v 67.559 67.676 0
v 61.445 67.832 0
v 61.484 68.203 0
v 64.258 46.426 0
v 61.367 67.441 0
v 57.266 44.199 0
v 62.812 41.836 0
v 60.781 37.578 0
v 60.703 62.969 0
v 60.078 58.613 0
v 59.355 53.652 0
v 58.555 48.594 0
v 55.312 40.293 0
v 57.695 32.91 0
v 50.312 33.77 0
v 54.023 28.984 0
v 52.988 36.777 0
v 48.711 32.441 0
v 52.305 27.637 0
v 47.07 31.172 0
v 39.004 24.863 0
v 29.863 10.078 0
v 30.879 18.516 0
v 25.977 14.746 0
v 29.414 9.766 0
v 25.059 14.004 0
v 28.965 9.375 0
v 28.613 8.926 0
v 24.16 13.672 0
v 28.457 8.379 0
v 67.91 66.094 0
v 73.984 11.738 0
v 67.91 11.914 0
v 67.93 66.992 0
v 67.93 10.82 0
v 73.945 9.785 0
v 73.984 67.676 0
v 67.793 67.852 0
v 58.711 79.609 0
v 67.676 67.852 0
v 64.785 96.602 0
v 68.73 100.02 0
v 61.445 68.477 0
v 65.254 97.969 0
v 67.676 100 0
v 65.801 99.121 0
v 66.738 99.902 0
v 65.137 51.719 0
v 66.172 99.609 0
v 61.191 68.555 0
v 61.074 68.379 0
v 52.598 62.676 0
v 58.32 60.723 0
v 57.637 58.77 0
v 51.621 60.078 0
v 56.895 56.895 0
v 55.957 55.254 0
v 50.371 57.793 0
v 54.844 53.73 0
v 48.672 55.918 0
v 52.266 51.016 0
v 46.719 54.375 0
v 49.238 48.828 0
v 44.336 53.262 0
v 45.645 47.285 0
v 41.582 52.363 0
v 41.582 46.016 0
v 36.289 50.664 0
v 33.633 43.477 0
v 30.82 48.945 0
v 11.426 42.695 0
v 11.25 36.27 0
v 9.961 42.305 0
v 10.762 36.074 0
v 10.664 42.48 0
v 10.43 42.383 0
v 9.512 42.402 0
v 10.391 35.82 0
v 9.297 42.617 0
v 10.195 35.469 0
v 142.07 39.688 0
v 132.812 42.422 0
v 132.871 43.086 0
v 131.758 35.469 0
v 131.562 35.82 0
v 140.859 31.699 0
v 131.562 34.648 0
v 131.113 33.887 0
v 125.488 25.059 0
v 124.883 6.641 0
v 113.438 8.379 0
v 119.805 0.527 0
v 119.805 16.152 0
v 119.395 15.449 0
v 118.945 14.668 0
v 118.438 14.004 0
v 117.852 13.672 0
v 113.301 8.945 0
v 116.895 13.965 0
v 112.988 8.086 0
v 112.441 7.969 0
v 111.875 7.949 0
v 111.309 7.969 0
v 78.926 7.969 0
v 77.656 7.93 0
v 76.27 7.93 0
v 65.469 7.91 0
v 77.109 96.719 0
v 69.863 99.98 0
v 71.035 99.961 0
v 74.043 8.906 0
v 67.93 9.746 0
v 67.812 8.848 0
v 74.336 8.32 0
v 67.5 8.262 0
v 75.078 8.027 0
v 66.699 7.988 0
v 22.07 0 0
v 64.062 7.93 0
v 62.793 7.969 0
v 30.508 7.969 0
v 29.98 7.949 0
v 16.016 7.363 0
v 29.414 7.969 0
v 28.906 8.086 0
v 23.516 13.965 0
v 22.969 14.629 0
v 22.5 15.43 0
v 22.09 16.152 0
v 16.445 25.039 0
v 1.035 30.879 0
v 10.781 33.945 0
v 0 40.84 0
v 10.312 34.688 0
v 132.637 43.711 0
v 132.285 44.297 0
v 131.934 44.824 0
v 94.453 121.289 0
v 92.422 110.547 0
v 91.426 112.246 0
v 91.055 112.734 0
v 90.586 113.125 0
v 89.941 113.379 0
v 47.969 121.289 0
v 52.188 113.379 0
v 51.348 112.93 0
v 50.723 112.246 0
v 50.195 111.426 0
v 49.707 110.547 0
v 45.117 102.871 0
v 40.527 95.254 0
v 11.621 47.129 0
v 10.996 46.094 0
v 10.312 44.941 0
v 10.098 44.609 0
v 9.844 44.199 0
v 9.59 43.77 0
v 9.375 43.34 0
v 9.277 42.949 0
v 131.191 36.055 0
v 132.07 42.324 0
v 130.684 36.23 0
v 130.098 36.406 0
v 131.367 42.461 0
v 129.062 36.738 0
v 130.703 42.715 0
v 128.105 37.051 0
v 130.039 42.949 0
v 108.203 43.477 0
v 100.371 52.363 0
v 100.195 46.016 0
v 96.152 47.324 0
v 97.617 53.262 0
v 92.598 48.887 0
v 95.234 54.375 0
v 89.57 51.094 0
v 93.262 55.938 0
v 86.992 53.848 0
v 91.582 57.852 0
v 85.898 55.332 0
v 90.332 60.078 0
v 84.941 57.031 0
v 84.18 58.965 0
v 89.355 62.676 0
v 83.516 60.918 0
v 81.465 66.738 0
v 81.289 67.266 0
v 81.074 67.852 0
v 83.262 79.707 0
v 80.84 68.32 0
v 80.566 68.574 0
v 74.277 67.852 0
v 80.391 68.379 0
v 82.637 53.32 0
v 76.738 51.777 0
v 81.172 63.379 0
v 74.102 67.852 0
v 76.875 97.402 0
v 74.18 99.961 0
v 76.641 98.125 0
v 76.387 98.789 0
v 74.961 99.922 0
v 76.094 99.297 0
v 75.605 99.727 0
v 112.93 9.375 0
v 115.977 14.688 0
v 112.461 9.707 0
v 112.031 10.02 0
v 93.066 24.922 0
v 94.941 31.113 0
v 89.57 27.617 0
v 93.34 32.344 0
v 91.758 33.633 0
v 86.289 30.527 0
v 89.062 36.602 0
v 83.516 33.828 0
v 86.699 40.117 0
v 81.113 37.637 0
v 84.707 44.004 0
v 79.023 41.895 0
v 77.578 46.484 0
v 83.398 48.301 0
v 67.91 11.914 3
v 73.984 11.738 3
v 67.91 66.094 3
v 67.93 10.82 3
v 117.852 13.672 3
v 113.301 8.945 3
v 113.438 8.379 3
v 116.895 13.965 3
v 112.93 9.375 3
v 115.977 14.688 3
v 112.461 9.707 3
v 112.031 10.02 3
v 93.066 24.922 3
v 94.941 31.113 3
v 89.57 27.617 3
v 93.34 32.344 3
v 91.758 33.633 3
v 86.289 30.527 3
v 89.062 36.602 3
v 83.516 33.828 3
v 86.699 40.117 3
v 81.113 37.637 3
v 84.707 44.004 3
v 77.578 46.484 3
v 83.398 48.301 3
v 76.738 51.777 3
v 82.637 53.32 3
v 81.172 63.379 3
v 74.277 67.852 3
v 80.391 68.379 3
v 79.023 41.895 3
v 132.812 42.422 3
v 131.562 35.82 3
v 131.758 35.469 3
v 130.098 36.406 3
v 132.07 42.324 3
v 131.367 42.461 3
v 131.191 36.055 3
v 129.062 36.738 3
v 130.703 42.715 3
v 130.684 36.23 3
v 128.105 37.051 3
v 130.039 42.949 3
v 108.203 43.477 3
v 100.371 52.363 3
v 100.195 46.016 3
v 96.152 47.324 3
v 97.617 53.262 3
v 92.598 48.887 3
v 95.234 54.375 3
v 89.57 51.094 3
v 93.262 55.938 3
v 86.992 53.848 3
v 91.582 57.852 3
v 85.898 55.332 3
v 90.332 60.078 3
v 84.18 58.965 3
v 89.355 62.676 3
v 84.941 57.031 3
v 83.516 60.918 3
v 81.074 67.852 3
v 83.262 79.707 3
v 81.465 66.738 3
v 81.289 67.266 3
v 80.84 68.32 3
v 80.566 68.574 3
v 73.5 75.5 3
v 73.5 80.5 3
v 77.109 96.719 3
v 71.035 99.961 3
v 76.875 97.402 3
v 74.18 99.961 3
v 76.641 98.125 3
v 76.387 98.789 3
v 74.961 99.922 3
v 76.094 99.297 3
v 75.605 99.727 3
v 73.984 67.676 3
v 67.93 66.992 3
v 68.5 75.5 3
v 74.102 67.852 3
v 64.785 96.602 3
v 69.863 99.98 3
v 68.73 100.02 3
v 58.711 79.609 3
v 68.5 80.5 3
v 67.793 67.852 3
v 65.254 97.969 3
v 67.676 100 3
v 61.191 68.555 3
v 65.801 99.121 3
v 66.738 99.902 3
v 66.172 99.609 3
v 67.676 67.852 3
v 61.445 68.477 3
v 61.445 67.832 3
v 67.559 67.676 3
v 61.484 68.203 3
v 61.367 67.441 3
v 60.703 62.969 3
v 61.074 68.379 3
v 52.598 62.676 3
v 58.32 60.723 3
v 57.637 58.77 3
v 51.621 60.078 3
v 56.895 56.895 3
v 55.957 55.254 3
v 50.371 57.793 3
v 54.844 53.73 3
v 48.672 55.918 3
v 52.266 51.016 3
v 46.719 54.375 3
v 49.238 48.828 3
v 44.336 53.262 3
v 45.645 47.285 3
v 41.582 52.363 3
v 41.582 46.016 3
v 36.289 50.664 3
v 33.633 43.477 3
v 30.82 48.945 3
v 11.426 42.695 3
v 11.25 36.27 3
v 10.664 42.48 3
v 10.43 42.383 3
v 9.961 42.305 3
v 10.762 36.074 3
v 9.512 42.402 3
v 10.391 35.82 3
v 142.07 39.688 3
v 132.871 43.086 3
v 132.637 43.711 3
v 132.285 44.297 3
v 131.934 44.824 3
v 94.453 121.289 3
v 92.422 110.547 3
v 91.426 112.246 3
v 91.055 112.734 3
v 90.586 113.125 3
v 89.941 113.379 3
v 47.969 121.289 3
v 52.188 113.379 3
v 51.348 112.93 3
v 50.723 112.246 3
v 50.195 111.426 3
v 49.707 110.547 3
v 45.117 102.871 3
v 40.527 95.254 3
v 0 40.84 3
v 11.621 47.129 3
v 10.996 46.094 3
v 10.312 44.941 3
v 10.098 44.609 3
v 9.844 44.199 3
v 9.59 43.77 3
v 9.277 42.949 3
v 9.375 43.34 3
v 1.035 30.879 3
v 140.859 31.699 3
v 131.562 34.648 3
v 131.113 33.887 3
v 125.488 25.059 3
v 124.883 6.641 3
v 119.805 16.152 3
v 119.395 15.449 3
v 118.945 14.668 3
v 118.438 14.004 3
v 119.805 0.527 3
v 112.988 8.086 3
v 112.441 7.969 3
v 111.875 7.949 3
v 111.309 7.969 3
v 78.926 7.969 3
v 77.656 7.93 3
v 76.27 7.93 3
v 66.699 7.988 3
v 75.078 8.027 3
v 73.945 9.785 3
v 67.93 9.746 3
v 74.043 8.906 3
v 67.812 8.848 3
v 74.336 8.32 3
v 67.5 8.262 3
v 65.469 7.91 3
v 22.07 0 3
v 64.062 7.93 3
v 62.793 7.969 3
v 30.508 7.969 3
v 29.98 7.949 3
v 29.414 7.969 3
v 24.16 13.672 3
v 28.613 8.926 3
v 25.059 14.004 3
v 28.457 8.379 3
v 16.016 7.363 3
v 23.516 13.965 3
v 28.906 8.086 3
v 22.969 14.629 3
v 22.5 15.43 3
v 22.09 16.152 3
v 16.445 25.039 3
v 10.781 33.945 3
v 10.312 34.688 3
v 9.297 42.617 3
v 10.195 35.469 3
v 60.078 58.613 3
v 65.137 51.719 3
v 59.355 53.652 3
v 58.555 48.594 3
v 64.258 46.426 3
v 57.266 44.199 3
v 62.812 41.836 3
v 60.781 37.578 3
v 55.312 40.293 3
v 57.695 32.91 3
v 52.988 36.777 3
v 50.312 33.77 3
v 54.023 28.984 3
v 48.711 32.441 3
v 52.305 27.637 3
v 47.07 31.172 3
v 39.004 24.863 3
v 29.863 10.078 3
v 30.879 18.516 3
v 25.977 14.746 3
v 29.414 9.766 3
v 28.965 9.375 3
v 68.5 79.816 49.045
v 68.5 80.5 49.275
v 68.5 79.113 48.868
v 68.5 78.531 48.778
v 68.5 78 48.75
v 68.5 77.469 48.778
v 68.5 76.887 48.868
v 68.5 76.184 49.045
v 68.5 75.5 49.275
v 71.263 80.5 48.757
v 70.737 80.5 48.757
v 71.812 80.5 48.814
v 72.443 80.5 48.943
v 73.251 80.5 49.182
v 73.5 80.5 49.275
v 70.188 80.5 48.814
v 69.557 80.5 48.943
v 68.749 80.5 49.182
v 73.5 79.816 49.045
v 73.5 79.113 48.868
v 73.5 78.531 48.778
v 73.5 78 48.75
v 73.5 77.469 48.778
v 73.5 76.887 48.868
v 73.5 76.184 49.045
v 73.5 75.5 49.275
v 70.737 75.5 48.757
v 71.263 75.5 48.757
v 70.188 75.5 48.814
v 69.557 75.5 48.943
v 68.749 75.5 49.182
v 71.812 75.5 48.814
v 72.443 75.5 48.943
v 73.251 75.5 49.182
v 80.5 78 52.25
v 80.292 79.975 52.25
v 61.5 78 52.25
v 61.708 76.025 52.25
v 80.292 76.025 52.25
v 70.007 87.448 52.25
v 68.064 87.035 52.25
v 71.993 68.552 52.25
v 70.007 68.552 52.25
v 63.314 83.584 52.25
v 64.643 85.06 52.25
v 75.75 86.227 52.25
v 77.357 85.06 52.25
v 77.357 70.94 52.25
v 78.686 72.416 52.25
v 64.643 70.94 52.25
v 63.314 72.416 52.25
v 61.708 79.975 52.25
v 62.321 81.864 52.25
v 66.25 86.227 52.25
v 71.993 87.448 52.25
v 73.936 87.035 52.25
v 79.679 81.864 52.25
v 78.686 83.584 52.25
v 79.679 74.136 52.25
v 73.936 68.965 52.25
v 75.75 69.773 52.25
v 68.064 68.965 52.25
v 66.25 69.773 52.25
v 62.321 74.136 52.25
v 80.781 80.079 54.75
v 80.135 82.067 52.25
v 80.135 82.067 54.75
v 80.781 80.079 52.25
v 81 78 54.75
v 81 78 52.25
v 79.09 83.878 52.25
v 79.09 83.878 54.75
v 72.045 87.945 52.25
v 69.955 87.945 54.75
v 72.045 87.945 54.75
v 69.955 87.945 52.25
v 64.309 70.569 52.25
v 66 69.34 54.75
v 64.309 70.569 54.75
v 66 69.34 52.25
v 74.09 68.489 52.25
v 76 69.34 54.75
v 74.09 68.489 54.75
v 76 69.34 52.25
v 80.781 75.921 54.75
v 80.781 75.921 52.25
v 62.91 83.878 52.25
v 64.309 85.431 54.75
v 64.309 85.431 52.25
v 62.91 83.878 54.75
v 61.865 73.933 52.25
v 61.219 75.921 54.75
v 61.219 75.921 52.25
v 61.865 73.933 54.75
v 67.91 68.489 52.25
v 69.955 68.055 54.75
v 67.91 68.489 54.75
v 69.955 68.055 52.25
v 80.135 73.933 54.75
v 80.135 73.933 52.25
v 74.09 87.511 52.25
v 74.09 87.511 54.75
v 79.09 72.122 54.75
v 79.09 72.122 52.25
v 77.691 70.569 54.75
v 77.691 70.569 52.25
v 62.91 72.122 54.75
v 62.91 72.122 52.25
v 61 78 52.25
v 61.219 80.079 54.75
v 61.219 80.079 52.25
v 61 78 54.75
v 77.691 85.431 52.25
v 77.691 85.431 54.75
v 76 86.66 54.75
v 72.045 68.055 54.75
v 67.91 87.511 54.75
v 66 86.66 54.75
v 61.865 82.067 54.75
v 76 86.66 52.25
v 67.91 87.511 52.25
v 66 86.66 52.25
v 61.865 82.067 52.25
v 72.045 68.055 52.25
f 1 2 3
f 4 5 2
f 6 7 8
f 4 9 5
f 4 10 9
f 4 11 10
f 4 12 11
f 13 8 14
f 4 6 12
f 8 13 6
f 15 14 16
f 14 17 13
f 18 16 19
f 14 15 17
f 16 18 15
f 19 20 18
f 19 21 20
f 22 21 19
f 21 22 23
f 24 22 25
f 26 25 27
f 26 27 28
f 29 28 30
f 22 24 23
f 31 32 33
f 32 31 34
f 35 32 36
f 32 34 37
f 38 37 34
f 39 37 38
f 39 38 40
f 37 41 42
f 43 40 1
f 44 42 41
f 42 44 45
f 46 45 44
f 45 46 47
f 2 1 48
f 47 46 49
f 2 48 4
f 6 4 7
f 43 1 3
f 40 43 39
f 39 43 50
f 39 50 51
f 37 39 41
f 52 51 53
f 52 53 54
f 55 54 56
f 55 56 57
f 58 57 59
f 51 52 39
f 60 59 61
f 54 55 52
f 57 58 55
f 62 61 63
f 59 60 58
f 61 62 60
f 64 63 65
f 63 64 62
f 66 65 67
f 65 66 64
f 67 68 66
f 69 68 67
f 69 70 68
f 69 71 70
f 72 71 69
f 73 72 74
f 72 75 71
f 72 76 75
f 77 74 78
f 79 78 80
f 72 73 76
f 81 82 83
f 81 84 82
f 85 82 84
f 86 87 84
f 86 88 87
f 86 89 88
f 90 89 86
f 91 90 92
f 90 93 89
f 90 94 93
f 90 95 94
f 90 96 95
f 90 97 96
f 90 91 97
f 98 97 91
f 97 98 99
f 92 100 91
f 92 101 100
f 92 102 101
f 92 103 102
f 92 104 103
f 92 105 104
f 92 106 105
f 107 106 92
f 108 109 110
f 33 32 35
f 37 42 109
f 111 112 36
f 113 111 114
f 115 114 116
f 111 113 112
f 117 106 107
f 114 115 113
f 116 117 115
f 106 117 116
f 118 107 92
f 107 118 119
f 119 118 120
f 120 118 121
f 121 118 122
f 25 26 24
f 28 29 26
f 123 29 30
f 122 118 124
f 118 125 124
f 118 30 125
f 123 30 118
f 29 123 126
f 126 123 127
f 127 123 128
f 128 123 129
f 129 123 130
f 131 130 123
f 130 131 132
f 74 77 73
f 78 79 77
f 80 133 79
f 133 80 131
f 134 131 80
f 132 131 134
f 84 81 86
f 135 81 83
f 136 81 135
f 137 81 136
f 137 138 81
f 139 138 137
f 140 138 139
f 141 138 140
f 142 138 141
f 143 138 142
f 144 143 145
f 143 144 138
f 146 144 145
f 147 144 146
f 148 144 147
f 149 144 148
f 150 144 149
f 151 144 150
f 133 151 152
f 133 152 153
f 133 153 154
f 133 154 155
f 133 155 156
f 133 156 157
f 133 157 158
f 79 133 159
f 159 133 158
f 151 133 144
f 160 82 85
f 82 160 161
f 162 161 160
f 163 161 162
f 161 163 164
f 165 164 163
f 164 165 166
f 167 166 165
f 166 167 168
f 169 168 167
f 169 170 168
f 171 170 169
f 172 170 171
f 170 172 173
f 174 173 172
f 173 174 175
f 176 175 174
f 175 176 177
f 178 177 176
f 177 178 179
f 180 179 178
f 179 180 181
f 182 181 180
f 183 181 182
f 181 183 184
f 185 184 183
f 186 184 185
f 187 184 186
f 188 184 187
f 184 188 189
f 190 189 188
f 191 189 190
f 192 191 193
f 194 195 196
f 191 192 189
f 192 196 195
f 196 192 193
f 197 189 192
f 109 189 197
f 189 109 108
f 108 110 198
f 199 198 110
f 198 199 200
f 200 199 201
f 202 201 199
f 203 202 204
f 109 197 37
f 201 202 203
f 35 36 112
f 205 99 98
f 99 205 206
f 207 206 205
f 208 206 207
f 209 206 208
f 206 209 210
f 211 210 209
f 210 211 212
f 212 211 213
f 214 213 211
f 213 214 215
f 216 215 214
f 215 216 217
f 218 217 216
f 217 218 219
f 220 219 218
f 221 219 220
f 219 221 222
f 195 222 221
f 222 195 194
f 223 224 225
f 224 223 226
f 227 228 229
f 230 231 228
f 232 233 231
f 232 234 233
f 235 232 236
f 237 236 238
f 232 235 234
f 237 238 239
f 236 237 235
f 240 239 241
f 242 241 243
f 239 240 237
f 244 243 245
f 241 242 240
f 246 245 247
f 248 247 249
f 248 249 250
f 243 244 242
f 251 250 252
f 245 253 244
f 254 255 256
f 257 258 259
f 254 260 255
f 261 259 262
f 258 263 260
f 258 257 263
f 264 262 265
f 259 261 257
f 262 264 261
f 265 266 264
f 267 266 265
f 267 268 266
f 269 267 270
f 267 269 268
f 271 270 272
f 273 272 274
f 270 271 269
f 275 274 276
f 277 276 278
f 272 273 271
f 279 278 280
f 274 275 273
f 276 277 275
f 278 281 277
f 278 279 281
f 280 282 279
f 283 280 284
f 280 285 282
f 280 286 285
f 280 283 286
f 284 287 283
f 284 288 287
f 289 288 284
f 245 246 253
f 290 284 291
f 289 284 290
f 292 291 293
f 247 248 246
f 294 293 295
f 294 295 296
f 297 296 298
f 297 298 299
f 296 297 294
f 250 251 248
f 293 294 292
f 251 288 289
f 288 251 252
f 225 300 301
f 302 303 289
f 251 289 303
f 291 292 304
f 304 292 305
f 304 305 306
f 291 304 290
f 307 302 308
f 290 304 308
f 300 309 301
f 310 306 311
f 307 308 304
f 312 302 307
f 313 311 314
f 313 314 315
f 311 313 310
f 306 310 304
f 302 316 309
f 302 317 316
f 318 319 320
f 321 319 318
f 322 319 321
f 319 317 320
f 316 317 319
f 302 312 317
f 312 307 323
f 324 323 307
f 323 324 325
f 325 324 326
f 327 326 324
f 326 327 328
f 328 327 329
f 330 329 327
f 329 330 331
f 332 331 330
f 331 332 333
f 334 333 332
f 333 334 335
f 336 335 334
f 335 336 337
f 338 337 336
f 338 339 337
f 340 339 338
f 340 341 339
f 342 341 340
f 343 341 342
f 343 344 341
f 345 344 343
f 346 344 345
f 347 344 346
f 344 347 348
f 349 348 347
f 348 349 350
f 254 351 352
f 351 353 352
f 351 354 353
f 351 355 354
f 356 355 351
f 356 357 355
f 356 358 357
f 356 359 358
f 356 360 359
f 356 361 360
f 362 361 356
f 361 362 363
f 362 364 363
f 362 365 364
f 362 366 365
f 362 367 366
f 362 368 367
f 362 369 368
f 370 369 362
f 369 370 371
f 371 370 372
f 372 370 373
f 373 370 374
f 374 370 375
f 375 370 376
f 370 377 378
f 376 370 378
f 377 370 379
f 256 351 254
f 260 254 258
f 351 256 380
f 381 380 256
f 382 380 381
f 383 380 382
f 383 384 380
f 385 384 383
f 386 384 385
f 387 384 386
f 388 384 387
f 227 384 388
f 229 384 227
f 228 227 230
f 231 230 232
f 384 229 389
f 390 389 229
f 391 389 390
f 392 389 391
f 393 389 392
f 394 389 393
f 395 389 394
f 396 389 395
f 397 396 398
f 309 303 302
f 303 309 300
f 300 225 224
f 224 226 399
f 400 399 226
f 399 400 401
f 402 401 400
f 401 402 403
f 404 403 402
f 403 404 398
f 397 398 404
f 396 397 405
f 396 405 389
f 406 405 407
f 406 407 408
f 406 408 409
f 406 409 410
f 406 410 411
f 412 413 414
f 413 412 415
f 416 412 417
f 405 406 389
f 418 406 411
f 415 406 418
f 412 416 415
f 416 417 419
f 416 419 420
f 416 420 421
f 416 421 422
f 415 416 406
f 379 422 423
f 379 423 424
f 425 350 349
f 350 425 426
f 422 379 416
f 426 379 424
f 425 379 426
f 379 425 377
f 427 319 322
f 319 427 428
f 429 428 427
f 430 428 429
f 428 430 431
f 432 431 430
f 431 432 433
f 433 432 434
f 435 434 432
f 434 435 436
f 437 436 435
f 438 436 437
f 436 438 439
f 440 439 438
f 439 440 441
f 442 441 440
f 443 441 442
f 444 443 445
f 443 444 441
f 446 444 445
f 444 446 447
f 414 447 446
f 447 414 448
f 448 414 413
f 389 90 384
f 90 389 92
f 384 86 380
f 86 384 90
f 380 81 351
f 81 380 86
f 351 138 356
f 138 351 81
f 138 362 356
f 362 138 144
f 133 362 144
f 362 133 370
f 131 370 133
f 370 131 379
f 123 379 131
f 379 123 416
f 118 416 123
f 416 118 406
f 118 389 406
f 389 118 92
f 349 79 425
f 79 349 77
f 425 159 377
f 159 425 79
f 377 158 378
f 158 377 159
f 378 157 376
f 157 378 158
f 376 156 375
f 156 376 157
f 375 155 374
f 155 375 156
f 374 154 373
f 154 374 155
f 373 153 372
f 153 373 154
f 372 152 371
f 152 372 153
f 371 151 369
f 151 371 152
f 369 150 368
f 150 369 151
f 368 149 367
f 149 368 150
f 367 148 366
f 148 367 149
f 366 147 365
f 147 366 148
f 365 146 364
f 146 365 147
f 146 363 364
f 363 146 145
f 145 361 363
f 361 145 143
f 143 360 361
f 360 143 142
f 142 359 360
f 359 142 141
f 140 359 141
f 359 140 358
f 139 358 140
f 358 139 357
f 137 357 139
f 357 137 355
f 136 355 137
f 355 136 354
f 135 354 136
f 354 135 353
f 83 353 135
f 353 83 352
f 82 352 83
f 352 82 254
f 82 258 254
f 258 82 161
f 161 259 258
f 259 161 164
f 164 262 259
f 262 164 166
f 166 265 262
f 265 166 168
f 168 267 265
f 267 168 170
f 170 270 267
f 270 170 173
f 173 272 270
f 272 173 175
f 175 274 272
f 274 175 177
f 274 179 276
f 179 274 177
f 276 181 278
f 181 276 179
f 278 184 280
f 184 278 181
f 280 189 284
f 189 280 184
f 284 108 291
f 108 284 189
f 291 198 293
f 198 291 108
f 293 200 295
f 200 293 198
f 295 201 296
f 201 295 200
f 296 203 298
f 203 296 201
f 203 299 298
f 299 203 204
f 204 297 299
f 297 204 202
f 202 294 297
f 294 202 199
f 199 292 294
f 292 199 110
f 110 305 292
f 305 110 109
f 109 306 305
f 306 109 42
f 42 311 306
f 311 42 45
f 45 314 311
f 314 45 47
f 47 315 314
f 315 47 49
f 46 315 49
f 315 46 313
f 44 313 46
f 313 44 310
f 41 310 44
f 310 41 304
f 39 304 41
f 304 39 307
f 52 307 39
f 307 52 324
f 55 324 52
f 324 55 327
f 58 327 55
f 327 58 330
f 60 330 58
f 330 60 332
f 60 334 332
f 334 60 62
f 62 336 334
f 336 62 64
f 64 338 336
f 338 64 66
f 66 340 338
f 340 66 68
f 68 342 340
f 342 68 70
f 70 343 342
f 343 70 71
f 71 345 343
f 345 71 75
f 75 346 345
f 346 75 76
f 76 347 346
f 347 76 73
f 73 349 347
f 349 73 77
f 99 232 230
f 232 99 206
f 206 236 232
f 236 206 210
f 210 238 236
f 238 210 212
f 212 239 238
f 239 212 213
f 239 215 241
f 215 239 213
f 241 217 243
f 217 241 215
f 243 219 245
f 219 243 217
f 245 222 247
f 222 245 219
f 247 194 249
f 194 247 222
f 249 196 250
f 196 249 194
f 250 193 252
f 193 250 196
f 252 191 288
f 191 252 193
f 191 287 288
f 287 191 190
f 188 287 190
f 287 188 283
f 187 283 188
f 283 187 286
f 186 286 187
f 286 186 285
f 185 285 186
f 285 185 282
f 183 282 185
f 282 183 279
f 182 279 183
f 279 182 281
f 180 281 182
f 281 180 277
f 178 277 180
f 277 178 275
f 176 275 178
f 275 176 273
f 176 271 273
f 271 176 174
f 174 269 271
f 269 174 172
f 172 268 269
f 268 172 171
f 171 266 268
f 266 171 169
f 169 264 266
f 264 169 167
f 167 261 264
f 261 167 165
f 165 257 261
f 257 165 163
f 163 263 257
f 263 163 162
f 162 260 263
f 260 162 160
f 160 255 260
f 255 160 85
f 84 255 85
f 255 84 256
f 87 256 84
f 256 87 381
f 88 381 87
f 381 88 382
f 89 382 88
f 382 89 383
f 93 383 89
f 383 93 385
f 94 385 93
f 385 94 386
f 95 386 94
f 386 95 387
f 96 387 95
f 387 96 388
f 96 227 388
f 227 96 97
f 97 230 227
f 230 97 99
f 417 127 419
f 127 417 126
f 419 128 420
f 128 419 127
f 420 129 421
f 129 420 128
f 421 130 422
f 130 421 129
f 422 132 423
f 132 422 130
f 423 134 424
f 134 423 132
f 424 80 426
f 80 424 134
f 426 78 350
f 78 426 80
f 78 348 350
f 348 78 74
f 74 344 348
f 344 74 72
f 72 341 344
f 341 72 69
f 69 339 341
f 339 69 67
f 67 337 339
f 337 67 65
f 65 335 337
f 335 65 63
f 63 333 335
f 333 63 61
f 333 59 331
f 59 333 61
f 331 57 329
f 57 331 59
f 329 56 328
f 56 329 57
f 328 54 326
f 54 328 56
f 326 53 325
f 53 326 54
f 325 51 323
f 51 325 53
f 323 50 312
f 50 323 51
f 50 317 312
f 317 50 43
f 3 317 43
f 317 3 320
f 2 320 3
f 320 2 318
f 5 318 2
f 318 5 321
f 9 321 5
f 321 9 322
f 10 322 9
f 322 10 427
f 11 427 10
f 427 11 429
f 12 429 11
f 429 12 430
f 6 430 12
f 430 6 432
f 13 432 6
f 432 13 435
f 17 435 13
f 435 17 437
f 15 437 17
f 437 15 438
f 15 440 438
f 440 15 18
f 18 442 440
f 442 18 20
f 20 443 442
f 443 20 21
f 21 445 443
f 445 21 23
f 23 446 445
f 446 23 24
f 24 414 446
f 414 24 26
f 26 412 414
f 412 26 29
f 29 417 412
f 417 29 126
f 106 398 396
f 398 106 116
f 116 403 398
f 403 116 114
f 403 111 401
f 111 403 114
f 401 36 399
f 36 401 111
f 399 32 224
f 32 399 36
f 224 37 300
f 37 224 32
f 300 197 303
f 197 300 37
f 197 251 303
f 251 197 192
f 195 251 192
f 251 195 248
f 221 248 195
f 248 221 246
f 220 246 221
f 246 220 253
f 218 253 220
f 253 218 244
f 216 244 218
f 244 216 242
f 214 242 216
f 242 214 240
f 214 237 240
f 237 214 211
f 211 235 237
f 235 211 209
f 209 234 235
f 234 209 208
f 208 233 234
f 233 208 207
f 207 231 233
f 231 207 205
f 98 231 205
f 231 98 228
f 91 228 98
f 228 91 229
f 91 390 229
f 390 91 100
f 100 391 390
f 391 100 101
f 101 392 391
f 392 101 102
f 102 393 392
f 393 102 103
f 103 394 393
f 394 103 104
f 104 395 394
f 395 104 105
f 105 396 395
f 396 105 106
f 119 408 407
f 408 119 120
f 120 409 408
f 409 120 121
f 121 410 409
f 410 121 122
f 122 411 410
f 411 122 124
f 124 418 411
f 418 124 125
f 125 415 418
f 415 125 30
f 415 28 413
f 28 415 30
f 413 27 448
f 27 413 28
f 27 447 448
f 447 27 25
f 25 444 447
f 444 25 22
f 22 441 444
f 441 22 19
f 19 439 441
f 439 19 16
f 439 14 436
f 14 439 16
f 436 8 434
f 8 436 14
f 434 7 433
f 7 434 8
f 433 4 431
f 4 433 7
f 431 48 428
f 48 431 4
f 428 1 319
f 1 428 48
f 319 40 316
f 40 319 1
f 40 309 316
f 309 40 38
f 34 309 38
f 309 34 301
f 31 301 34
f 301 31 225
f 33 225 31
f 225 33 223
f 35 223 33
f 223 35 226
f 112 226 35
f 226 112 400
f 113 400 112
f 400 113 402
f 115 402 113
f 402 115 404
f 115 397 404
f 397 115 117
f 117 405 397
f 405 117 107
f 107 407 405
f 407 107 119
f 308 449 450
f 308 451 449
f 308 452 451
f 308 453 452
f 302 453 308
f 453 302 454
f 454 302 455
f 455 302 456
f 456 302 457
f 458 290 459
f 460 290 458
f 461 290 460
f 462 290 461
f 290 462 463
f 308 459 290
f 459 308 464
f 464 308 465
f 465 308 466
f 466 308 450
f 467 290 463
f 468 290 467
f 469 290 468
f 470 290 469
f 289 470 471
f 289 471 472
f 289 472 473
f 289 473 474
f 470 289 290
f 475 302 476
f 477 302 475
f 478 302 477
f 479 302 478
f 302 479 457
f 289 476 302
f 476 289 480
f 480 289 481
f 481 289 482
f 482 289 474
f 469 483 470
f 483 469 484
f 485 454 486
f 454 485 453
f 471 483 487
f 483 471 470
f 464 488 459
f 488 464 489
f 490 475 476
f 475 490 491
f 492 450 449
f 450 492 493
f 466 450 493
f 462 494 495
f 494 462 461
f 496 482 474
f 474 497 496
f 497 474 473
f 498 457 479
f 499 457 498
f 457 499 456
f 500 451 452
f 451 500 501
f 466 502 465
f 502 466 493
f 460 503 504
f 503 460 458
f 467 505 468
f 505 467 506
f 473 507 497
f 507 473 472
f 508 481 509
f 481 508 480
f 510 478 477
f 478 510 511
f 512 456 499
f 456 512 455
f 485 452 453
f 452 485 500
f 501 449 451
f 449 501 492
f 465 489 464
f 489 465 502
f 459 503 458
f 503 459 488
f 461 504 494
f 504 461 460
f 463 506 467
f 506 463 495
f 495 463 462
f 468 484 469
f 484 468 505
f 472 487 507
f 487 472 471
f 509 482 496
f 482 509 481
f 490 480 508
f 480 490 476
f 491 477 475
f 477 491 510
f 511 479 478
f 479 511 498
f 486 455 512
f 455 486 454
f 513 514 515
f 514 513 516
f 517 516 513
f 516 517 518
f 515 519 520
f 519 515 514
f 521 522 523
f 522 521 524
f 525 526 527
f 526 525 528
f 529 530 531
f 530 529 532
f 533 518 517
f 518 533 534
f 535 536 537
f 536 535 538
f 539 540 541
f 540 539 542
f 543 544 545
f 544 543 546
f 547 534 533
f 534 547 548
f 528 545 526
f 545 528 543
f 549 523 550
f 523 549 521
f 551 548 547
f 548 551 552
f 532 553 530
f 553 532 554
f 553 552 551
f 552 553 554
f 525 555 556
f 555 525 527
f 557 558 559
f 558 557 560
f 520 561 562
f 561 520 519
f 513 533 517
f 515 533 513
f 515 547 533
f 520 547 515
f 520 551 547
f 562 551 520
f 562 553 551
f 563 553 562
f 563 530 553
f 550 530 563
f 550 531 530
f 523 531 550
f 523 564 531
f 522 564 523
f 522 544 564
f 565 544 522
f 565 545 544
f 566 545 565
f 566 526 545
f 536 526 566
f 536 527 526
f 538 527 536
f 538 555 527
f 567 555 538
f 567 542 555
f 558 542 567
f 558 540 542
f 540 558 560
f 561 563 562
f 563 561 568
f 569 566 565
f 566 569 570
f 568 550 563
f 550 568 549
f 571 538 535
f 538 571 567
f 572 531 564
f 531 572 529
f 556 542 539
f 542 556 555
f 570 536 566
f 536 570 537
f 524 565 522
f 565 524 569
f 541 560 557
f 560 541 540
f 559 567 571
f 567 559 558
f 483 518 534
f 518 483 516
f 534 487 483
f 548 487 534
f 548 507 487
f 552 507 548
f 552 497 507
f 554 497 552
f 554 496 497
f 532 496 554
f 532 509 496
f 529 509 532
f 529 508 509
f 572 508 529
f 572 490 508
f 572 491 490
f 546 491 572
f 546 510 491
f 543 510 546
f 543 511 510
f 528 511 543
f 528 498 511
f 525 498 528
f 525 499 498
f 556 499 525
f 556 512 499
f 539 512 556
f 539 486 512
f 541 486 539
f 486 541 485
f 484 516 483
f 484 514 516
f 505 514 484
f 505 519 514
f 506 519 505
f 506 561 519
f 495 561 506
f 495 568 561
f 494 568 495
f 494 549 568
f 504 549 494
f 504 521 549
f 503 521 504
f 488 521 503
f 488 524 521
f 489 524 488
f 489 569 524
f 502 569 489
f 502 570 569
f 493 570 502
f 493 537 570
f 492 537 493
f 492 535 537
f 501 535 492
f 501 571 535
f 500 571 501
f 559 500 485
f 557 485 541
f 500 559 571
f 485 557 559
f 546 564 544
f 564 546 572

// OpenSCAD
// The Logo
logo_h = 3;
color("Gold")
	scale([20,20,1])
		dxf_linear_extrude(file = "components/sdw_logo.dxf", height = logo_h);

// The Handle
handle_x = 71;
handle_y = 78;
handle_s = 5;
handle_h = 50;
color("Blue")
	linear_extrude(height = handle_h, convexity = 20)
		translate([handle_x,handle_y,0])
			square([handle_s,handle_s], center = true);

// The Grip
grip_h = 5;
grip_r1 = 0;
grip_r2 = 10;

color("Red")
	translate([handle_x,handle_y,handle_h])
		cylinder(h = grip_h, r1 = grip_r1, r2 = grip_r2, center = true);
color("Red")
	translate([handle_x,handle_y,handle_h + 1 + (grip_h/2)])
		cylinder(h = grip_h/2, r = grip_r2, center = true);
